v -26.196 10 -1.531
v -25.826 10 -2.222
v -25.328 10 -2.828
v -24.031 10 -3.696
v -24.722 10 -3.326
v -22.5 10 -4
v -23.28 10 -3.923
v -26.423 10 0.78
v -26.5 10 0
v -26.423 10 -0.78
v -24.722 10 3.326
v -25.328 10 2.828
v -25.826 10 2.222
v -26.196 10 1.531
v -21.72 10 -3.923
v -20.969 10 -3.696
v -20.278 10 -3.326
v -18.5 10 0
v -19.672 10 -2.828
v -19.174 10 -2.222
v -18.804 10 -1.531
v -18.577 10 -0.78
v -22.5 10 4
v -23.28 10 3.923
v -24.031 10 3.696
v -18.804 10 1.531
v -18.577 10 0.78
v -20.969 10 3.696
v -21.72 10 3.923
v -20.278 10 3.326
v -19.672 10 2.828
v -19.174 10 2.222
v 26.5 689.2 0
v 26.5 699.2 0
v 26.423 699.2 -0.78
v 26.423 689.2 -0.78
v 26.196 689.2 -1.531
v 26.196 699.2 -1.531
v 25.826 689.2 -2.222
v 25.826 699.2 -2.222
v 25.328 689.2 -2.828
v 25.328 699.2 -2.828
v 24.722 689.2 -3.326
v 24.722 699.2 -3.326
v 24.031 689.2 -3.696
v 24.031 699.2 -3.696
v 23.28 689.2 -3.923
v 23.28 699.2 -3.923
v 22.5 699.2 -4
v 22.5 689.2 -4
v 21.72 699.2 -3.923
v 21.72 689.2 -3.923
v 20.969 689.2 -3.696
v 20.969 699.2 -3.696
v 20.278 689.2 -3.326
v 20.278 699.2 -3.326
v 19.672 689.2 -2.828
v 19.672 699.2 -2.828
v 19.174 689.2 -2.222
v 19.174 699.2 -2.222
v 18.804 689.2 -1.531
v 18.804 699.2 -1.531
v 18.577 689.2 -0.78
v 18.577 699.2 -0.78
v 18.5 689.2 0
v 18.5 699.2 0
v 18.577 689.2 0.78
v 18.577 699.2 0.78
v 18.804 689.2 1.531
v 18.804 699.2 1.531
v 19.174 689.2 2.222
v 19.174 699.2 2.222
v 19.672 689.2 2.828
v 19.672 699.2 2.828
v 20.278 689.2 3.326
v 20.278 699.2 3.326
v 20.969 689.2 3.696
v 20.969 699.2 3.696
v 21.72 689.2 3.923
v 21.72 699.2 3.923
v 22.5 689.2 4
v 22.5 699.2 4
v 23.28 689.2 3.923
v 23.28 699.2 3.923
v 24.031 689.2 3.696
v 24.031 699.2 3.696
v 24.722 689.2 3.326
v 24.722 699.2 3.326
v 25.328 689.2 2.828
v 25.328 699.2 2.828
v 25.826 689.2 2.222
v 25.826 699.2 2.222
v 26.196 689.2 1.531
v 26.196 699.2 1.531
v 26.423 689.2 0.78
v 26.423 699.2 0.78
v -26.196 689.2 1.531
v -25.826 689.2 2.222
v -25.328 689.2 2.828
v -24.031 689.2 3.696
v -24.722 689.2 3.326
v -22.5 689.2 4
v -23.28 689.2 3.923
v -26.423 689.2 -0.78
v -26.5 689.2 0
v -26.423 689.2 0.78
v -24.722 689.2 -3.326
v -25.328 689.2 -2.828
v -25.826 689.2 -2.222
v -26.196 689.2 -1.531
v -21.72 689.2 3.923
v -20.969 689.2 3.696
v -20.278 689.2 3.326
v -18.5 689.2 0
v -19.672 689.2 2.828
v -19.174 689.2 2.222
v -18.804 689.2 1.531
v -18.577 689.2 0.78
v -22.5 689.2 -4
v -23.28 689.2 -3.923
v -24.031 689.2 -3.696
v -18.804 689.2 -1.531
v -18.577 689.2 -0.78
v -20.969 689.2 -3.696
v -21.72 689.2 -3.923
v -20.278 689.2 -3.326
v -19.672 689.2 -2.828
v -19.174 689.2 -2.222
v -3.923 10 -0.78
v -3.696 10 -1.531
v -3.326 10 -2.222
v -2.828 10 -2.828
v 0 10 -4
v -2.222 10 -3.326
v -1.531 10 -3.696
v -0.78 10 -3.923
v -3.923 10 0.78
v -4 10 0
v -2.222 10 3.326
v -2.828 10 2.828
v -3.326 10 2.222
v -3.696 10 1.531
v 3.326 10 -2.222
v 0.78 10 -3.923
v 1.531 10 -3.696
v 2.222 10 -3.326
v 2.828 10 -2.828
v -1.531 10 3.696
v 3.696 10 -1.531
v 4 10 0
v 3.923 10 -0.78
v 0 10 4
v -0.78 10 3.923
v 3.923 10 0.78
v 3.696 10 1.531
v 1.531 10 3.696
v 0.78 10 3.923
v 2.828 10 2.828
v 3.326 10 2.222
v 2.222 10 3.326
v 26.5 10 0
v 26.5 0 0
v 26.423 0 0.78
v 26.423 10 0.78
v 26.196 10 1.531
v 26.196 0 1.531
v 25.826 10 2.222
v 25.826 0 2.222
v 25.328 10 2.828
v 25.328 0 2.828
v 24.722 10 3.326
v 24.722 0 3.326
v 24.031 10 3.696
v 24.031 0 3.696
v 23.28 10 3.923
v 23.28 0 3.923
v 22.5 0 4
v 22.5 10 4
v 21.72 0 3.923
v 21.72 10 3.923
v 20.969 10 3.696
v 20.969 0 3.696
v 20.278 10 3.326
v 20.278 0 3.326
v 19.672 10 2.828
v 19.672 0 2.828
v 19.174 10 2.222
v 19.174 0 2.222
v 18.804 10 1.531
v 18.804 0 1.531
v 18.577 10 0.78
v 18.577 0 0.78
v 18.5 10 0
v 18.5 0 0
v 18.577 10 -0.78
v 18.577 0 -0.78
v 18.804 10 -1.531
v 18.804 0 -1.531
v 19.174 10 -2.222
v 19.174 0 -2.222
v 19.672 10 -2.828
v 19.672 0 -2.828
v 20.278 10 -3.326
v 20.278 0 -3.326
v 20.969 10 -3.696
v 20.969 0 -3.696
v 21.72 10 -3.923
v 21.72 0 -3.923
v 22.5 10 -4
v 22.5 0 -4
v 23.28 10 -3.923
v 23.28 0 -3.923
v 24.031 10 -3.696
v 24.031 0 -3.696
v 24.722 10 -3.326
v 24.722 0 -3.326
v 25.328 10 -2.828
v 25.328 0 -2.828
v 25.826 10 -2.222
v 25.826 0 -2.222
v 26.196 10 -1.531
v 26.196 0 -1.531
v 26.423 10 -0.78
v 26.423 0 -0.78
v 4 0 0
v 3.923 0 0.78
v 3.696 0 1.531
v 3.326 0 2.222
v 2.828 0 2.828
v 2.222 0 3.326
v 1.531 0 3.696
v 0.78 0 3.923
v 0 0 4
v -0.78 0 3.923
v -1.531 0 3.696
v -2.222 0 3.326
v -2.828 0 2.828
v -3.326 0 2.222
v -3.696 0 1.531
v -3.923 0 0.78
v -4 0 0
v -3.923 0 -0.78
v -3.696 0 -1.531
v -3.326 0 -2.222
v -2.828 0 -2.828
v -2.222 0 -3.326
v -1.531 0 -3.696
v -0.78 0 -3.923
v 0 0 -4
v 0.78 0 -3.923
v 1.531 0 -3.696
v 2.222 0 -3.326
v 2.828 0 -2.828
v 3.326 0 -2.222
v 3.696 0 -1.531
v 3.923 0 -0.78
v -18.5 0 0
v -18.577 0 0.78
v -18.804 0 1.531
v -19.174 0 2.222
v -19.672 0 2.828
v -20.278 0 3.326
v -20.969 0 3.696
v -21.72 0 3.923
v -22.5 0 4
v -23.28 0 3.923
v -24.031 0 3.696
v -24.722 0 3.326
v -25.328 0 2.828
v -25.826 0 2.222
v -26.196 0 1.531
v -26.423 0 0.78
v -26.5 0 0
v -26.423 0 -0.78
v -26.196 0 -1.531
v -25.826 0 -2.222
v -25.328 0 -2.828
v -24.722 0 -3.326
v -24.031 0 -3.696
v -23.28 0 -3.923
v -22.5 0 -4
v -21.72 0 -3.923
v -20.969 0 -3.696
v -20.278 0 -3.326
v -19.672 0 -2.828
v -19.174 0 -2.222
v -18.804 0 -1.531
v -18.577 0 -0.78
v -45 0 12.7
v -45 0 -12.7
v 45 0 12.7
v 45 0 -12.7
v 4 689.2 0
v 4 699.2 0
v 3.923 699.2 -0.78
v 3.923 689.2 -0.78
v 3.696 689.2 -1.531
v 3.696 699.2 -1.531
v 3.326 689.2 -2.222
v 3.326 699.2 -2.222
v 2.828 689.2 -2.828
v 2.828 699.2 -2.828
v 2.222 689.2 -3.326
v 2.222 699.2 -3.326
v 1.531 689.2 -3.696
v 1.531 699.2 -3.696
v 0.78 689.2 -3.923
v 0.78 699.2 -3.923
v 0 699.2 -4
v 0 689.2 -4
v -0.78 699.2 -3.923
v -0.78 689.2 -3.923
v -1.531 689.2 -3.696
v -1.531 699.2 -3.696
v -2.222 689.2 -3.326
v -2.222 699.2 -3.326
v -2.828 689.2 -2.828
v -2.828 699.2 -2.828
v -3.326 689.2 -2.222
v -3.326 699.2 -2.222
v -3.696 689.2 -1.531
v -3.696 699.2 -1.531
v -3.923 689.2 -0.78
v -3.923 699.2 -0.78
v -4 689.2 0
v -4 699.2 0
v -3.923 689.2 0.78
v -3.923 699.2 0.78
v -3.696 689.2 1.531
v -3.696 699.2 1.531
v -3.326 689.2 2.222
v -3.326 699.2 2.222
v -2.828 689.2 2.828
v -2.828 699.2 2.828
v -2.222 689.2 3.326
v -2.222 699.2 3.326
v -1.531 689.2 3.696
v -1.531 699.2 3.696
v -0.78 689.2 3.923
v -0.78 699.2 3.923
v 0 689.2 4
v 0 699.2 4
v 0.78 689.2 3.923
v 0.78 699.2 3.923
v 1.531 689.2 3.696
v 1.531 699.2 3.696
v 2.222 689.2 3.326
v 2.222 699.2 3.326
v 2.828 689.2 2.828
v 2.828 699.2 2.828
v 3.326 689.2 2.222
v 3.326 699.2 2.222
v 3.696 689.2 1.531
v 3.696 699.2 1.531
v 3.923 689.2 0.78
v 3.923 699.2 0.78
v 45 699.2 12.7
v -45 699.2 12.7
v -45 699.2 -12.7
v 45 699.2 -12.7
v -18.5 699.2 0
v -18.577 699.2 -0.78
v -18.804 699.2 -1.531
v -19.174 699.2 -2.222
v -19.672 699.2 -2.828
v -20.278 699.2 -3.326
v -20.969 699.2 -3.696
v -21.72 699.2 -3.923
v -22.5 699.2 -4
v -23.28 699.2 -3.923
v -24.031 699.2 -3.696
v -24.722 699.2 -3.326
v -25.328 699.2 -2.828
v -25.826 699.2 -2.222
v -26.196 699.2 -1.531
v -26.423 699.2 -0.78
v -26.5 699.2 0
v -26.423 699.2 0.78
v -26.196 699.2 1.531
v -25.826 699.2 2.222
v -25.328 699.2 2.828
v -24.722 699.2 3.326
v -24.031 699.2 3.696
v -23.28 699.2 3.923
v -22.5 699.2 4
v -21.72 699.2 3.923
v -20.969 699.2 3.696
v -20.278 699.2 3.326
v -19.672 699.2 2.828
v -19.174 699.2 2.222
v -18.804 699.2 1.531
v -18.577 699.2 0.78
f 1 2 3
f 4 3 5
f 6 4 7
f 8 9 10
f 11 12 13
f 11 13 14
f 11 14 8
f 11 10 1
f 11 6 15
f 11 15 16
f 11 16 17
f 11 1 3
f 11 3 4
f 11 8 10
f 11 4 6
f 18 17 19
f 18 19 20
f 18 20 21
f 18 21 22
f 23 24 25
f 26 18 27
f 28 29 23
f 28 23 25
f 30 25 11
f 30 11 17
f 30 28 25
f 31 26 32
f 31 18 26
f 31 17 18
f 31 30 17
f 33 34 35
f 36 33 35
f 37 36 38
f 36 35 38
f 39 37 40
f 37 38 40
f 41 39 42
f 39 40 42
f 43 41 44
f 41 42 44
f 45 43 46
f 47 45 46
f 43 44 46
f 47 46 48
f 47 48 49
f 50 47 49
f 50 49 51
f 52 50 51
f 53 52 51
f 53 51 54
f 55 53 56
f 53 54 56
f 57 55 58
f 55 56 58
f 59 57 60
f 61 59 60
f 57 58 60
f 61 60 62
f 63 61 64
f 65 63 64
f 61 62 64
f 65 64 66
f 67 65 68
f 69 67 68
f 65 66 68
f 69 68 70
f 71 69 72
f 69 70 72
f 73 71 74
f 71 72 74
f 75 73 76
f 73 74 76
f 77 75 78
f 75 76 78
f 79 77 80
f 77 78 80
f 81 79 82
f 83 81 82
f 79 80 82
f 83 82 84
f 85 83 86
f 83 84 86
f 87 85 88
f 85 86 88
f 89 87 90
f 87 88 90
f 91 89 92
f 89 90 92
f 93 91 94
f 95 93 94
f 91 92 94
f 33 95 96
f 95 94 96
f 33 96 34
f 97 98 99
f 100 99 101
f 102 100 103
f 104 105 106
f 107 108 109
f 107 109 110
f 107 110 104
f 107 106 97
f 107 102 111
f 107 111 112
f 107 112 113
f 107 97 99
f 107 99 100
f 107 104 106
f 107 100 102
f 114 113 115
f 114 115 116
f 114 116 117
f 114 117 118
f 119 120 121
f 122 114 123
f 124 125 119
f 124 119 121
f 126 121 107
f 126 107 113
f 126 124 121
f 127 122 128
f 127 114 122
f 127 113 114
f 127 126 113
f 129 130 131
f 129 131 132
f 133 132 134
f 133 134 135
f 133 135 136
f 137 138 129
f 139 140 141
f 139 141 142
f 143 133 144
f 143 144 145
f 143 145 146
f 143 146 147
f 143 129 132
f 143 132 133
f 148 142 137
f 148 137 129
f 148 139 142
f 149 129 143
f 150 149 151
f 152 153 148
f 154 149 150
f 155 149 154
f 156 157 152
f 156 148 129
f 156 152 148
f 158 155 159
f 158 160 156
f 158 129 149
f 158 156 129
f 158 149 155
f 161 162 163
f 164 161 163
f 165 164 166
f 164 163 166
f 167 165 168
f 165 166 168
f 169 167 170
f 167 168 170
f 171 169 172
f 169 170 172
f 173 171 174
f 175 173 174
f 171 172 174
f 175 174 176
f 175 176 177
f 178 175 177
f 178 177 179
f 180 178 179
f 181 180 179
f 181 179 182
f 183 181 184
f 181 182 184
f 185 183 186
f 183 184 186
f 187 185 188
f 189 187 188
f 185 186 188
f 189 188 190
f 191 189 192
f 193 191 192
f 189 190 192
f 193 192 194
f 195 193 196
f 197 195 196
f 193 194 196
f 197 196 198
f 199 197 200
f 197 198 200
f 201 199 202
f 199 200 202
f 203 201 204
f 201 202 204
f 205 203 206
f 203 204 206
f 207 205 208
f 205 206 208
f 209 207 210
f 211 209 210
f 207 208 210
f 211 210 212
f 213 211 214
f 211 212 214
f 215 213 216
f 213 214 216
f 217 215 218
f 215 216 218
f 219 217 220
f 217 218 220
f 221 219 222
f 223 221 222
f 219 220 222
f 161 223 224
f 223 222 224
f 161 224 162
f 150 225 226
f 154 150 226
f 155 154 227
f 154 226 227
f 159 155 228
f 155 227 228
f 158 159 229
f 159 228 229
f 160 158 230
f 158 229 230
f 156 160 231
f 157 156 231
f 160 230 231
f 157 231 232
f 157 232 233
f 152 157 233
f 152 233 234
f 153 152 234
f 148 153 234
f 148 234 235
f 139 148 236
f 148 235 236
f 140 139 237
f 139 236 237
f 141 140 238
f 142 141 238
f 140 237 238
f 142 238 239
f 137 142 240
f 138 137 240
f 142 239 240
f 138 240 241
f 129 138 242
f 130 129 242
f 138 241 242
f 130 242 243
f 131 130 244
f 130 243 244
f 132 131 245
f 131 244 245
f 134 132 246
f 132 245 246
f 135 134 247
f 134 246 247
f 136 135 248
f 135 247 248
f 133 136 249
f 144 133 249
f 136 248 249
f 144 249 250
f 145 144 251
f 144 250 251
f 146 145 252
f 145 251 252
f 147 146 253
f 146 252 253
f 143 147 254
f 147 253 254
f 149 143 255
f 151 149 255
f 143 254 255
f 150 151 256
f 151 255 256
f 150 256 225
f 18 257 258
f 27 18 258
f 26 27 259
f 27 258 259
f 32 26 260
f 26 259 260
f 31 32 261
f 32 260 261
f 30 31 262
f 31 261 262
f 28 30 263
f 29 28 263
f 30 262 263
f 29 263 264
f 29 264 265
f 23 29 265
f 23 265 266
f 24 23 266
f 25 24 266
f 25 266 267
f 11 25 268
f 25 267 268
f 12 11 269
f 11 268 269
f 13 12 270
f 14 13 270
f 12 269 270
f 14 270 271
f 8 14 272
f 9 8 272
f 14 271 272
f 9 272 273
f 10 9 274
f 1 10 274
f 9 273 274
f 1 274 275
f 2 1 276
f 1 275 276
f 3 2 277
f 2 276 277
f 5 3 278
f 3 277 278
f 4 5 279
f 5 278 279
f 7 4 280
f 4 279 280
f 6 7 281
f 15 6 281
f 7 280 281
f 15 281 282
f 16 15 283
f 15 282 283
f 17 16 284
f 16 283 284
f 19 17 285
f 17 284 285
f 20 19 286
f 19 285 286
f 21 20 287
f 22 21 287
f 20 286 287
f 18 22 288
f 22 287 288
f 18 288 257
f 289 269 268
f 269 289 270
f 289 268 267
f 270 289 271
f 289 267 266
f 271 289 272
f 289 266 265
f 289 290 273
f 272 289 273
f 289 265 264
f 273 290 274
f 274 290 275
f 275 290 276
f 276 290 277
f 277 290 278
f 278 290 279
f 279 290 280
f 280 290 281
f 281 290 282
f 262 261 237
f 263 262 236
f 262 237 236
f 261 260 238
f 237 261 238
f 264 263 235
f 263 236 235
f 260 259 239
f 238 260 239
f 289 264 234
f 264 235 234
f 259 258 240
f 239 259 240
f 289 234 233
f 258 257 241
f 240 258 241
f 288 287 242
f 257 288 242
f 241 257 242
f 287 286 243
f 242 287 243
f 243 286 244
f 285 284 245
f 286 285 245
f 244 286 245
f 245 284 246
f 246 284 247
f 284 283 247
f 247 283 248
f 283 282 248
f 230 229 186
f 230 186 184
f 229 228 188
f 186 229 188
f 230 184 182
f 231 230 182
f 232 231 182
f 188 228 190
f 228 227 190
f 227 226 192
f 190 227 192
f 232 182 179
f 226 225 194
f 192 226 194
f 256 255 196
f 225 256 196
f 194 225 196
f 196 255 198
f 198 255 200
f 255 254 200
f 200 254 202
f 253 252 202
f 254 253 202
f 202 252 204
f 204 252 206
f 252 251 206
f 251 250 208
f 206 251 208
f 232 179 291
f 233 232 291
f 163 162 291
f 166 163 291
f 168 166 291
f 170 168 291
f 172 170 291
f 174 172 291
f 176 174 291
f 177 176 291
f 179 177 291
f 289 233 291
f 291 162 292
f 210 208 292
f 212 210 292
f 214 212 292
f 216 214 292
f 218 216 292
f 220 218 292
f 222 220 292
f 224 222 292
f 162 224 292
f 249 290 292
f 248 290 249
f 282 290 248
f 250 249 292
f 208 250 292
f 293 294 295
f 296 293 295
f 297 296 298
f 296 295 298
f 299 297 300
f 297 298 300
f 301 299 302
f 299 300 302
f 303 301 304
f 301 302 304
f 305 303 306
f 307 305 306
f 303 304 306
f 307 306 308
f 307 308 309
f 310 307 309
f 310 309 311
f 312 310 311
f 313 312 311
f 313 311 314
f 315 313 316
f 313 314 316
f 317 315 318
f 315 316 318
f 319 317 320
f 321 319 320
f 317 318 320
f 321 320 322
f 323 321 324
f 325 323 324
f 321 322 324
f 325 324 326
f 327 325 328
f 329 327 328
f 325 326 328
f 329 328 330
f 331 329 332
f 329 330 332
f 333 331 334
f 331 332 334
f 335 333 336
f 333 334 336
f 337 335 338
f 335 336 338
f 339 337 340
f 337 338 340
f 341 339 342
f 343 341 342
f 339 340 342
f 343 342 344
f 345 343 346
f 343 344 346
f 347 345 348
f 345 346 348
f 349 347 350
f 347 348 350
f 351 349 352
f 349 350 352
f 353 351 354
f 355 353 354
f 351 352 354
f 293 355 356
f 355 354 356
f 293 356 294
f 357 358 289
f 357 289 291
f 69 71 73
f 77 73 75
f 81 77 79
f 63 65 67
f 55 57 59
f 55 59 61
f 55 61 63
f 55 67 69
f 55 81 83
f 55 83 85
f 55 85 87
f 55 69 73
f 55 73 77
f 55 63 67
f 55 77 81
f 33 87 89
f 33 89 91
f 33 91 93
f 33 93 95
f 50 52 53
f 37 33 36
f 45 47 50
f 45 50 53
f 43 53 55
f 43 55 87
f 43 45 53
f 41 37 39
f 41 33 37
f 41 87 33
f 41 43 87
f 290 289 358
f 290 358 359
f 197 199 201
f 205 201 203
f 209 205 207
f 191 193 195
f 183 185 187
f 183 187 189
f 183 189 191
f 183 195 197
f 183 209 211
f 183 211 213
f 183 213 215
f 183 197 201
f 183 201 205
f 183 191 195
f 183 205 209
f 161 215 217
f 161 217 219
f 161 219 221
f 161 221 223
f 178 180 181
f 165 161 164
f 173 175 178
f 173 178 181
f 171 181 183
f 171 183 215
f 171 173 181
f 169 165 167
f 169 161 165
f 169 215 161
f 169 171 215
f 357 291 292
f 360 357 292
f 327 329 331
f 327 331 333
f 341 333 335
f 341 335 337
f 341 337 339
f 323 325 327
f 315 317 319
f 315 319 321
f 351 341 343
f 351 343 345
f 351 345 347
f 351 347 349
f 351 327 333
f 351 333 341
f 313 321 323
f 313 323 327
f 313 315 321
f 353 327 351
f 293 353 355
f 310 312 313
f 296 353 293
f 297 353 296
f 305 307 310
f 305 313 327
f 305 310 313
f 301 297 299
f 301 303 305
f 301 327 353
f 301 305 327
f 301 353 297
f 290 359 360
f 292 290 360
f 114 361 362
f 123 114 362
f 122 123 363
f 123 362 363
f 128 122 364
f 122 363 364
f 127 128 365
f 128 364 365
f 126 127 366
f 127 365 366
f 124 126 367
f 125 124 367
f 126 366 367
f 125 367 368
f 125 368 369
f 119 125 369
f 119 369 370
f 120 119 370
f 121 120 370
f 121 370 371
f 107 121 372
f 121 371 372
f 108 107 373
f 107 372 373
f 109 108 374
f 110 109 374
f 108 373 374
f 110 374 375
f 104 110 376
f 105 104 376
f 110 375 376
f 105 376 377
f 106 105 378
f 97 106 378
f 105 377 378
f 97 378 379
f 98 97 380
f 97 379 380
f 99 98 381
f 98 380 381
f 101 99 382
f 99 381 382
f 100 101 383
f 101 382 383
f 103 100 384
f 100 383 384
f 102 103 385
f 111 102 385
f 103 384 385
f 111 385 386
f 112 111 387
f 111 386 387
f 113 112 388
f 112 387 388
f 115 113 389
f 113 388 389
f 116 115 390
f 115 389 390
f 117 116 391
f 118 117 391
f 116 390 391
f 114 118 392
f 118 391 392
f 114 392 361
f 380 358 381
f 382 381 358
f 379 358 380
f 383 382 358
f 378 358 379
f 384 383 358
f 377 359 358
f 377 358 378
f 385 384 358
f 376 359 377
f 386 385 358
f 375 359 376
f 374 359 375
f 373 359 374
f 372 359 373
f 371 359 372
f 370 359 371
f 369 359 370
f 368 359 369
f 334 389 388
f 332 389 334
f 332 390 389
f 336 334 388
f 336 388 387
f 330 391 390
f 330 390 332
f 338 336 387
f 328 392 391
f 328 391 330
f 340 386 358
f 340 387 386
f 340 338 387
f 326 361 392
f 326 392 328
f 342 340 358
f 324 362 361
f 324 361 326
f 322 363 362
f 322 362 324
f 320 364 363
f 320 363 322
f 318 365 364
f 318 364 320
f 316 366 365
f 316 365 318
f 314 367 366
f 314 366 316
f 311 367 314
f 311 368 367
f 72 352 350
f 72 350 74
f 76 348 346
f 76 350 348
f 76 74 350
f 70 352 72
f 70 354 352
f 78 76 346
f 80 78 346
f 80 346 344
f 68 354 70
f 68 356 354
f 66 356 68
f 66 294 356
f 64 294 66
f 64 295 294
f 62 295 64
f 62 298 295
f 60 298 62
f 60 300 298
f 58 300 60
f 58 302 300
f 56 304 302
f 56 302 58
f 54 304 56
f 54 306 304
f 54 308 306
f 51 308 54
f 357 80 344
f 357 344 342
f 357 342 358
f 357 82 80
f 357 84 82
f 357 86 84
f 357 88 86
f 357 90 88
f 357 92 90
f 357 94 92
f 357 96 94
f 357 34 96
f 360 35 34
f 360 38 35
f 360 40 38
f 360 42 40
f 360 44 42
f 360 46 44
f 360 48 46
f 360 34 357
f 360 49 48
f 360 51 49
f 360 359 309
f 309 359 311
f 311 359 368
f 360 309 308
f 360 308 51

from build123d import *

# Parameters (mm, degrees)
CROQUIS1_W              = 90
CROQUIS1_H              = 25.4
SALIENTE_EXTRUIR1_DEPTH = 699.2
CROQUIS3_R              = 4
CORTAR_EXTRUIR1_DEPTH   = 10
CROQUIS4_R              = 4
CORTAR_EXTRUIR2_DEPTH   = 10


with BuildPart() as part:
    # Croquis1 → Saliente-Extruir1 (new body)
    with BuildSketch(Plane(origin=(0, 0, 0), x_dir=(1, 0, 0), z_dir=(0, 1, 0))):
        Rectangle(CROQUIS1_W, CROQUIS1_H)
    extrude(amount=SALIENTE_EXTRUIR1_DEPTH)

    # Croquis3 → Cortar-Extruir1 (cut)
    with BuildSketch(Plane(origin=(0, 699.2, 0), x_dir=(1, 0, 0), z_dir=(0, 1, 0))):
        Circle(CROQUIS3_R)
        with Locations((22.5, 0)):
            Circle(CROQUIS3_R)
        with Locations((-22.5, 0)):
            Circle(CROQUIS3_R)
    extrude(amount=-CORTAR_EXTRUIR1_DEPTH, mode=Mode.SUBTRACT)

    # Croquis4 → Cortar-Extruir2 (cut)
    with BuildSketch(Plane.XZ):
        Circle(CROQUIS4_R)
        with Locations((22.5, 0)):
            Circle(CROQUIS4_R)
        with Locations((-22.5, 0)):
            Circle(CROQUIS4_R)
    extrude(amount=-CORTAR_EXTRUIR2_DEPTH, mode=Mode.SUBTRACT)


solid = part.part
